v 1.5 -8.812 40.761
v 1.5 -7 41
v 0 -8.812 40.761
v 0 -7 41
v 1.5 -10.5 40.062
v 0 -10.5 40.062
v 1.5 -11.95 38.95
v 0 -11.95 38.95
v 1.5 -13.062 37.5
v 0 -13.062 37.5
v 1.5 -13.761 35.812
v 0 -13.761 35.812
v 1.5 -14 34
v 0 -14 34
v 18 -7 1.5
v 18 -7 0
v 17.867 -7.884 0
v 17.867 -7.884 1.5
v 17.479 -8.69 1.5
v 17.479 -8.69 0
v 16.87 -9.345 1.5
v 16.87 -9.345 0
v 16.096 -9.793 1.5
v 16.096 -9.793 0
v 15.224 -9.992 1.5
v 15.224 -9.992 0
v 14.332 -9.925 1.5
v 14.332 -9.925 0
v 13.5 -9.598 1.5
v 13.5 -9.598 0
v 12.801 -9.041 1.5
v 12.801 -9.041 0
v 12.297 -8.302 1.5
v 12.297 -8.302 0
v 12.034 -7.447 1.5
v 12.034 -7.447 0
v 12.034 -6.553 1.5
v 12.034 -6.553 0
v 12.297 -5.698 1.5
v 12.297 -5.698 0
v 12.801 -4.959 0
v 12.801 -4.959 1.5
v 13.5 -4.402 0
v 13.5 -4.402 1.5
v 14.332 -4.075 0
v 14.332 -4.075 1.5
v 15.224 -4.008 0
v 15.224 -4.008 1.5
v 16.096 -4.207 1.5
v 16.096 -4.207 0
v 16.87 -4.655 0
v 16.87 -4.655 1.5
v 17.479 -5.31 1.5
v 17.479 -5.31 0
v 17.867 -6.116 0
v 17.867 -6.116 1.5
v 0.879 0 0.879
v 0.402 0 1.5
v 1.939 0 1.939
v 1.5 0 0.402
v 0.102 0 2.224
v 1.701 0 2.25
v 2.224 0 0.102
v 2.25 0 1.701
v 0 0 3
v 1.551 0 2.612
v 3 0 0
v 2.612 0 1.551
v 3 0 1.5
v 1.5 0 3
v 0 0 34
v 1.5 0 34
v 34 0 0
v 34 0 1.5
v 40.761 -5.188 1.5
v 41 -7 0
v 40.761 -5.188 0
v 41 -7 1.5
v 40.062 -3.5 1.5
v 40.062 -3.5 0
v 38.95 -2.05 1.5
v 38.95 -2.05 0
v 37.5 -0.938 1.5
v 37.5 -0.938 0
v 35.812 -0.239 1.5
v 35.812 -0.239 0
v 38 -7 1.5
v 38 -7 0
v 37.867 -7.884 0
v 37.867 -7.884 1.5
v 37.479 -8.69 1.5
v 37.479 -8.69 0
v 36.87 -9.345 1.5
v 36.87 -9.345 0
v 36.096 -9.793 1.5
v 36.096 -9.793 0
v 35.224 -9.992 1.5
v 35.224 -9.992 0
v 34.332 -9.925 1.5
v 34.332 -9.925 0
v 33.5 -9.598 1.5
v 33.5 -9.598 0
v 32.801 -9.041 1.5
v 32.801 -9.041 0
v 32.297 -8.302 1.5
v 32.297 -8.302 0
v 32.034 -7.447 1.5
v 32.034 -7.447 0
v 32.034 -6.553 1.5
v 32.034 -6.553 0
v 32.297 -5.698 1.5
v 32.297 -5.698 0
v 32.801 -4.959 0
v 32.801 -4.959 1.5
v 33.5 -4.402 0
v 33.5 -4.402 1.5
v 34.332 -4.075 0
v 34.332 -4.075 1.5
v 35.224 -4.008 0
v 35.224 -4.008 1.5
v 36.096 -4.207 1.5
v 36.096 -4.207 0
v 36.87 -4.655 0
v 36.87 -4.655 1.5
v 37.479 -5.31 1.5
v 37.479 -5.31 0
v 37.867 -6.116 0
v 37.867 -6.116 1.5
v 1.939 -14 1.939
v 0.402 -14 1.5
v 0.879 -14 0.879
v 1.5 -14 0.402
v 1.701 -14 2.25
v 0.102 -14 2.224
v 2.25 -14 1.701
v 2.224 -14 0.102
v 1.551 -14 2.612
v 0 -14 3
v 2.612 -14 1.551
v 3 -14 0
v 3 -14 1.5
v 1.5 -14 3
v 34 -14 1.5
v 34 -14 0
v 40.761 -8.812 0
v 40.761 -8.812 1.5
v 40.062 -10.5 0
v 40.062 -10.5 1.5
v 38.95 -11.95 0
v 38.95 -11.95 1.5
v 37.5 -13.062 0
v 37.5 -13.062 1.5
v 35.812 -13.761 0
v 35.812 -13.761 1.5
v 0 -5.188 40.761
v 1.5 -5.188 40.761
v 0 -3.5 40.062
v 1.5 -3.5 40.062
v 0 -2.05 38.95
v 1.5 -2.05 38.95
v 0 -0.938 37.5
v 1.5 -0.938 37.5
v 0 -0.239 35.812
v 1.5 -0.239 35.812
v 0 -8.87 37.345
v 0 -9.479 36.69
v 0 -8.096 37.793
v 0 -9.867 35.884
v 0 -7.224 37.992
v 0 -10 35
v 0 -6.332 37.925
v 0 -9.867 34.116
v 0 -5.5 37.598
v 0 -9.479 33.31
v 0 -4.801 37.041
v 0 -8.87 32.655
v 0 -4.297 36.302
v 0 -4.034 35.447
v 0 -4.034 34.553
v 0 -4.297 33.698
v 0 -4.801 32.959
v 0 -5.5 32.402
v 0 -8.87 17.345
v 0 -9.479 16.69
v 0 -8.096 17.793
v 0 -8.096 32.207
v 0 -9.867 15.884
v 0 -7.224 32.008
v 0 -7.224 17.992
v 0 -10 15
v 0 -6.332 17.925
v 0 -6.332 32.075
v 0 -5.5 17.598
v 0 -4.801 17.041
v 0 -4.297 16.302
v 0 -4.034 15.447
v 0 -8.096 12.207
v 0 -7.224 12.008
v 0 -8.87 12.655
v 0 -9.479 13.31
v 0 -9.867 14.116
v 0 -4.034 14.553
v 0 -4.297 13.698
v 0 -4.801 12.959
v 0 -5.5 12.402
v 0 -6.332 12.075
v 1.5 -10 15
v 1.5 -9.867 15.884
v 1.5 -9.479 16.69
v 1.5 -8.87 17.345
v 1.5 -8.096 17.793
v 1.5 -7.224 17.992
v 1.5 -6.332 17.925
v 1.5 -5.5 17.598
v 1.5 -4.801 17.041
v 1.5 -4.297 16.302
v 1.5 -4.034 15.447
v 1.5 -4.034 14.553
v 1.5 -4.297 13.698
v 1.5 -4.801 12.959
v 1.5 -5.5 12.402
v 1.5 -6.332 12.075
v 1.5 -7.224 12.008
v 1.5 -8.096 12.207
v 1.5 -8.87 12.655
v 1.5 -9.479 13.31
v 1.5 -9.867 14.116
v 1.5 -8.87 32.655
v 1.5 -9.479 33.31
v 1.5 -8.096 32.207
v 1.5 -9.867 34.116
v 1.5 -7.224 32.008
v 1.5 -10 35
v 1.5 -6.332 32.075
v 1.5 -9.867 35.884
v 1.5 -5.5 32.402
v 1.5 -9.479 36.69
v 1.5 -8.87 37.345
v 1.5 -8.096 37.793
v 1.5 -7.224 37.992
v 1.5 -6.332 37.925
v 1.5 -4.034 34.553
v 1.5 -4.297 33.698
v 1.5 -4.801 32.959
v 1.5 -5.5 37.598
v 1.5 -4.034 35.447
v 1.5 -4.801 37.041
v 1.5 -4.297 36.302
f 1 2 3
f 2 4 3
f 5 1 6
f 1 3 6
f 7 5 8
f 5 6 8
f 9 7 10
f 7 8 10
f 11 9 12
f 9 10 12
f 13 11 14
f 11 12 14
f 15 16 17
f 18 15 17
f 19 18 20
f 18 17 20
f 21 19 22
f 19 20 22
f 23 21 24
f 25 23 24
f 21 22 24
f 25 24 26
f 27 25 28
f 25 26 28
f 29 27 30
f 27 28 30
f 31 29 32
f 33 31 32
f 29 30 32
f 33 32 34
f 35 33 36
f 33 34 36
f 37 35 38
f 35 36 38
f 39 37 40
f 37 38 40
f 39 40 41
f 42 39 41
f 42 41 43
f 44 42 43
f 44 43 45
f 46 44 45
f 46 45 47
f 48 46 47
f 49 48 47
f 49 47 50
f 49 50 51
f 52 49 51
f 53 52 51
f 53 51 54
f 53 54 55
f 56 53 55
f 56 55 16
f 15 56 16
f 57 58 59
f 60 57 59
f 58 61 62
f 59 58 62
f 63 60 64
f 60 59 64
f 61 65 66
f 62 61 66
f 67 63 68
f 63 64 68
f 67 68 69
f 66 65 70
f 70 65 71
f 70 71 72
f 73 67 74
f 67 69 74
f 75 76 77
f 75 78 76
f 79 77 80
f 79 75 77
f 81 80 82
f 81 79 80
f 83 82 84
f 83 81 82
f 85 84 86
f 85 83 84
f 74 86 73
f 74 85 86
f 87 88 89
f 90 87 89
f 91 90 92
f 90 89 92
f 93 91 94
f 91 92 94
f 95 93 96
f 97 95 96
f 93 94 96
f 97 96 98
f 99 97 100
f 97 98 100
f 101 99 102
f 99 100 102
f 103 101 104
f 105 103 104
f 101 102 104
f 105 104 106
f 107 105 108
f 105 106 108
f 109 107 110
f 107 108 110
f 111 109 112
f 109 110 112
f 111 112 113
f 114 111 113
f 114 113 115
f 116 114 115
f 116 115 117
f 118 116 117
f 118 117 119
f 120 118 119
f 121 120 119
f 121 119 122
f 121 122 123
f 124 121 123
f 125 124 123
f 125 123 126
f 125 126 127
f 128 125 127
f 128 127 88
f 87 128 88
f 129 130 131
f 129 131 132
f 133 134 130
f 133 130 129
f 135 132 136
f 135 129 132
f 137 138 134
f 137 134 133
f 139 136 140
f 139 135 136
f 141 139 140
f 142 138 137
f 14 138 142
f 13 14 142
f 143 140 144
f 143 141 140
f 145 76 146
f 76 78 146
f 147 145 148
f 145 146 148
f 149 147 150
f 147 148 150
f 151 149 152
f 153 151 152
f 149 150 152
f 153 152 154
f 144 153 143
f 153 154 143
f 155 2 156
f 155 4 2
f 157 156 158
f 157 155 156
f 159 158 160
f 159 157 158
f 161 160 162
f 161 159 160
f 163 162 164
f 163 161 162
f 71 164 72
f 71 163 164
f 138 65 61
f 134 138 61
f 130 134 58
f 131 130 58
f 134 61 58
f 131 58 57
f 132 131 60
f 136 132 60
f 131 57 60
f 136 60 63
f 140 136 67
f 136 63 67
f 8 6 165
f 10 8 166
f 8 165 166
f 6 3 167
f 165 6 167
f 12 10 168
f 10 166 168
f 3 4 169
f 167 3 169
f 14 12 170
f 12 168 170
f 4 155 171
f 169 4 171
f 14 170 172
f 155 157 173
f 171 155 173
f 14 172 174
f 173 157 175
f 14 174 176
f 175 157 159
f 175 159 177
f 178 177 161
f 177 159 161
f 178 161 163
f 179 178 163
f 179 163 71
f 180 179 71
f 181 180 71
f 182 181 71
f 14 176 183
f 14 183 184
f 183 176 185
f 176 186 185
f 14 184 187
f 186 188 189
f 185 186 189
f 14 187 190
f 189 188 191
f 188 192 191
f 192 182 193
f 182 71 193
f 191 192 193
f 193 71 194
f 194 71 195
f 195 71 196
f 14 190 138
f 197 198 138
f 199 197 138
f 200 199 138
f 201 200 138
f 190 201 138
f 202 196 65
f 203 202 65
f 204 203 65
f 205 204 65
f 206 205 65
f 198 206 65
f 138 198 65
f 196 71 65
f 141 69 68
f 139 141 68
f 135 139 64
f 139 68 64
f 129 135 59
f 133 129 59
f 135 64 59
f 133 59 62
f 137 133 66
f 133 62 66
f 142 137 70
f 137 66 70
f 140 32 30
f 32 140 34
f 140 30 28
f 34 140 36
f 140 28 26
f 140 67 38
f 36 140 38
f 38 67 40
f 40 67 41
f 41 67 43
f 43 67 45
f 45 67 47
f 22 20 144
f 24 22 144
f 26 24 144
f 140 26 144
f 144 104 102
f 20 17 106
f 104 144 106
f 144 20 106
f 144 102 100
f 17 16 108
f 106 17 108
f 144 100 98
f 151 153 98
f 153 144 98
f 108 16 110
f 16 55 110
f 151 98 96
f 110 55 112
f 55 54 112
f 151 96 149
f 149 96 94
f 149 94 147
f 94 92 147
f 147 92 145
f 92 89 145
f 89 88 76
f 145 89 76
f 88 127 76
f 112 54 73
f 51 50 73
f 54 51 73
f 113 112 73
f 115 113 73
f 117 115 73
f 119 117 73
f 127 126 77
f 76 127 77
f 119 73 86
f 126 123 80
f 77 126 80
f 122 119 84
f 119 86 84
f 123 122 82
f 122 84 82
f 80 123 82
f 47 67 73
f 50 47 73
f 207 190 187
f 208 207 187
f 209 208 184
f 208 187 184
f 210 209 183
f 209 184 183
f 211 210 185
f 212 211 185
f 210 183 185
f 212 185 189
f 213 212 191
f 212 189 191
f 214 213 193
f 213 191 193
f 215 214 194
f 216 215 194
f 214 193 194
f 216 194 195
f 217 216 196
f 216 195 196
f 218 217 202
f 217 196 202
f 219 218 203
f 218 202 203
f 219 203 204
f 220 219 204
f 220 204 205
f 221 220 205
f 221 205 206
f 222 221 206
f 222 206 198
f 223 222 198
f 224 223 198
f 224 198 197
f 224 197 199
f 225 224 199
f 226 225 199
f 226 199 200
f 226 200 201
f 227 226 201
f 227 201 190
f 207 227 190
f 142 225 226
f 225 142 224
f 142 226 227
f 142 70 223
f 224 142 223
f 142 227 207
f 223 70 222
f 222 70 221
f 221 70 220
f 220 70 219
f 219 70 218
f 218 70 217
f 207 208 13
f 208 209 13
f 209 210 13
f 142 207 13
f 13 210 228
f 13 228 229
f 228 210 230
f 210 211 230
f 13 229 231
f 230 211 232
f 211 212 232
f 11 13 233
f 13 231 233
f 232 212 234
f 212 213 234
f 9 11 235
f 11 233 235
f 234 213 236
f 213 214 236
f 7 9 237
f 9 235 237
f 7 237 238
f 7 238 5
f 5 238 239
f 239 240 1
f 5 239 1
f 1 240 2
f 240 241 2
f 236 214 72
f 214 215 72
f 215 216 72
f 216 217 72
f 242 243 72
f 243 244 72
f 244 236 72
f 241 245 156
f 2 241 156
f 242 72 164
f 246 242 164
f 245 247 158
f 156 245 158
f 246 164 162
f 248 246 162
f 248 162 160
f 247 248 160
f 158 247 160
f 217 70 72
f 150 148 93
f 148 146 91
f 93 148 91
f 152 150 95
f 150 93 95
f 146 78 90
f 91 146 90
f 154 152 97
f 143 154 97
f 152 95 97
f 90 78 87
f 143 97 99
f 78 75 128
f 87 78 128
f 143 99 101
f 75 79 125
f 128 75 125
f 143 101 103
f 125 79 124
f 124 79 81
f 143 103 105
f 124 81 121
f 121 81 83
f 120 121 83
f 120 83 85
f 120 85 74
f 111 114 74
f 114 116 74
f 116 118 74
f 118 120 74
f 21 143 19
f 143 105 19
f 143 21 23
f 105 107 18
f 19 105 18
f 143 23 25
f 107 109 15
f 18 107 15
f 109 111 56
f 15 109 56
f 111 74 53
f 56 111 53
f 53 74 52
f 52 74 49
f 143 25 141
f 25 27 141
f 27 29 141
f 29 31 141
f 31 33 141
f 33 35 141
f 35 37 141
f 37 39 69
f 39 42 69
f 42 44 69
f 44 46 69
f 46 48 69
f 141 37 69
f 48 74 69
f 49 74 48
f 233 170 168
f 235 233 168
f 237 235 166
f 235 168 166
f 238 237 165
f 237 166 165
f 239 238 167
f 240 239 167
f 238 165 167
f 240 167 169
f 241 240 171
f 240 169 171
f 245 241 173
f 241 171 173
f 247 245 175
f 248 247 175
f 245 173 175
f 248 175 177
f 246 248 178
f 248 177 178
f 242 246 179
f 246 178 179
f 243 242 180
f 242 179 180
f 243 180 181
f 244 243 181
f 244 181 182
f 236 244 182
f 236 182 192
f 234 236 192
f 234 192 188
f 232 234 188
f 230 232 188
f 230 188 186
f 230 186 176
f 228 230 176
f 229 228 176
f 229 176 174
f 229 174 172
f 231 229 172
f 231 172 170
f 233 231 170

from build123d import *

# Parameters (mm, degrees)
F1_DEPTH = 14
F2_R     = 6.99999
F3_R     = 3
F4_DEPTH = 25
F5_R     = 3
F6_DEPTH = 25


# Not quite as in the source:
# - a fillet or chamfer is up to 0.001 mm smaller than in the source, because OpenCascade refuses the exact size


with BuildPart() as f1:
    # F0 (on Front) → F1 (new body)
    with BuildSketch(Plane.XZ):
        with BuildLine():
            Line((3, 0), (41, 0))
            Line((41, 0), (41, 1.5))
            Line((41, 1.5), (3, 1.5))
            ThreePointArc((3, 1.5), (1.9393398282, 1.9393398282), (1.5, 3))
            Line((1.5, 3), (1.5, 41))
            Line((1.5, 41), (0, 41))
            Line((0, 41), (0, 3))
            ThreePointArc((0, 3), (0.8786796564, 0.8786796564), (3, 0))
        make_face()
    extrude(amount=F1_DEPTH)

    # F2 (radius 7 in the source; OpenCascade refuses exactly that, so slightly less here)
    f2_edges = [f1.edges().sort_by_distance(p)[0] for p in [
        (41, 0, 0.75),
        (41, -14, 0.75),
        (0.75, 0, 41),
        (0.75, -14, 41),
    ]]
    fillet(f2_edges, radius=F2_R)

    # F3 (on face) → F4 (cut)
    with BuildSketch(Plane(origin=(0, 0, 0), x_dir=(0, -1, 0), z_dir=(-1, 0, 0))):
        with Locations((7, 15)):
            Circle(F3_R)
        with Locations((7, 35)):
            Circle(F3_R)
    extrude(amount=-F4_DEPTH, mode=Mode.SUBTRACT)

    # F5 (on face) → F6 (cut)
    with BuildSketch(Plane(origin=(0, 0, 0), x_dir=(1, 0, 0), z_dir=(0, 0, -1))):
        with Locations((35, 7)):
            Circle(F5_R)
        with Locations((15, 7)):
            Circle(F5_R)
    extrude(amount=-F6_DEPTH, mode=Mode.SUBTRACT)


solid = f1.part
